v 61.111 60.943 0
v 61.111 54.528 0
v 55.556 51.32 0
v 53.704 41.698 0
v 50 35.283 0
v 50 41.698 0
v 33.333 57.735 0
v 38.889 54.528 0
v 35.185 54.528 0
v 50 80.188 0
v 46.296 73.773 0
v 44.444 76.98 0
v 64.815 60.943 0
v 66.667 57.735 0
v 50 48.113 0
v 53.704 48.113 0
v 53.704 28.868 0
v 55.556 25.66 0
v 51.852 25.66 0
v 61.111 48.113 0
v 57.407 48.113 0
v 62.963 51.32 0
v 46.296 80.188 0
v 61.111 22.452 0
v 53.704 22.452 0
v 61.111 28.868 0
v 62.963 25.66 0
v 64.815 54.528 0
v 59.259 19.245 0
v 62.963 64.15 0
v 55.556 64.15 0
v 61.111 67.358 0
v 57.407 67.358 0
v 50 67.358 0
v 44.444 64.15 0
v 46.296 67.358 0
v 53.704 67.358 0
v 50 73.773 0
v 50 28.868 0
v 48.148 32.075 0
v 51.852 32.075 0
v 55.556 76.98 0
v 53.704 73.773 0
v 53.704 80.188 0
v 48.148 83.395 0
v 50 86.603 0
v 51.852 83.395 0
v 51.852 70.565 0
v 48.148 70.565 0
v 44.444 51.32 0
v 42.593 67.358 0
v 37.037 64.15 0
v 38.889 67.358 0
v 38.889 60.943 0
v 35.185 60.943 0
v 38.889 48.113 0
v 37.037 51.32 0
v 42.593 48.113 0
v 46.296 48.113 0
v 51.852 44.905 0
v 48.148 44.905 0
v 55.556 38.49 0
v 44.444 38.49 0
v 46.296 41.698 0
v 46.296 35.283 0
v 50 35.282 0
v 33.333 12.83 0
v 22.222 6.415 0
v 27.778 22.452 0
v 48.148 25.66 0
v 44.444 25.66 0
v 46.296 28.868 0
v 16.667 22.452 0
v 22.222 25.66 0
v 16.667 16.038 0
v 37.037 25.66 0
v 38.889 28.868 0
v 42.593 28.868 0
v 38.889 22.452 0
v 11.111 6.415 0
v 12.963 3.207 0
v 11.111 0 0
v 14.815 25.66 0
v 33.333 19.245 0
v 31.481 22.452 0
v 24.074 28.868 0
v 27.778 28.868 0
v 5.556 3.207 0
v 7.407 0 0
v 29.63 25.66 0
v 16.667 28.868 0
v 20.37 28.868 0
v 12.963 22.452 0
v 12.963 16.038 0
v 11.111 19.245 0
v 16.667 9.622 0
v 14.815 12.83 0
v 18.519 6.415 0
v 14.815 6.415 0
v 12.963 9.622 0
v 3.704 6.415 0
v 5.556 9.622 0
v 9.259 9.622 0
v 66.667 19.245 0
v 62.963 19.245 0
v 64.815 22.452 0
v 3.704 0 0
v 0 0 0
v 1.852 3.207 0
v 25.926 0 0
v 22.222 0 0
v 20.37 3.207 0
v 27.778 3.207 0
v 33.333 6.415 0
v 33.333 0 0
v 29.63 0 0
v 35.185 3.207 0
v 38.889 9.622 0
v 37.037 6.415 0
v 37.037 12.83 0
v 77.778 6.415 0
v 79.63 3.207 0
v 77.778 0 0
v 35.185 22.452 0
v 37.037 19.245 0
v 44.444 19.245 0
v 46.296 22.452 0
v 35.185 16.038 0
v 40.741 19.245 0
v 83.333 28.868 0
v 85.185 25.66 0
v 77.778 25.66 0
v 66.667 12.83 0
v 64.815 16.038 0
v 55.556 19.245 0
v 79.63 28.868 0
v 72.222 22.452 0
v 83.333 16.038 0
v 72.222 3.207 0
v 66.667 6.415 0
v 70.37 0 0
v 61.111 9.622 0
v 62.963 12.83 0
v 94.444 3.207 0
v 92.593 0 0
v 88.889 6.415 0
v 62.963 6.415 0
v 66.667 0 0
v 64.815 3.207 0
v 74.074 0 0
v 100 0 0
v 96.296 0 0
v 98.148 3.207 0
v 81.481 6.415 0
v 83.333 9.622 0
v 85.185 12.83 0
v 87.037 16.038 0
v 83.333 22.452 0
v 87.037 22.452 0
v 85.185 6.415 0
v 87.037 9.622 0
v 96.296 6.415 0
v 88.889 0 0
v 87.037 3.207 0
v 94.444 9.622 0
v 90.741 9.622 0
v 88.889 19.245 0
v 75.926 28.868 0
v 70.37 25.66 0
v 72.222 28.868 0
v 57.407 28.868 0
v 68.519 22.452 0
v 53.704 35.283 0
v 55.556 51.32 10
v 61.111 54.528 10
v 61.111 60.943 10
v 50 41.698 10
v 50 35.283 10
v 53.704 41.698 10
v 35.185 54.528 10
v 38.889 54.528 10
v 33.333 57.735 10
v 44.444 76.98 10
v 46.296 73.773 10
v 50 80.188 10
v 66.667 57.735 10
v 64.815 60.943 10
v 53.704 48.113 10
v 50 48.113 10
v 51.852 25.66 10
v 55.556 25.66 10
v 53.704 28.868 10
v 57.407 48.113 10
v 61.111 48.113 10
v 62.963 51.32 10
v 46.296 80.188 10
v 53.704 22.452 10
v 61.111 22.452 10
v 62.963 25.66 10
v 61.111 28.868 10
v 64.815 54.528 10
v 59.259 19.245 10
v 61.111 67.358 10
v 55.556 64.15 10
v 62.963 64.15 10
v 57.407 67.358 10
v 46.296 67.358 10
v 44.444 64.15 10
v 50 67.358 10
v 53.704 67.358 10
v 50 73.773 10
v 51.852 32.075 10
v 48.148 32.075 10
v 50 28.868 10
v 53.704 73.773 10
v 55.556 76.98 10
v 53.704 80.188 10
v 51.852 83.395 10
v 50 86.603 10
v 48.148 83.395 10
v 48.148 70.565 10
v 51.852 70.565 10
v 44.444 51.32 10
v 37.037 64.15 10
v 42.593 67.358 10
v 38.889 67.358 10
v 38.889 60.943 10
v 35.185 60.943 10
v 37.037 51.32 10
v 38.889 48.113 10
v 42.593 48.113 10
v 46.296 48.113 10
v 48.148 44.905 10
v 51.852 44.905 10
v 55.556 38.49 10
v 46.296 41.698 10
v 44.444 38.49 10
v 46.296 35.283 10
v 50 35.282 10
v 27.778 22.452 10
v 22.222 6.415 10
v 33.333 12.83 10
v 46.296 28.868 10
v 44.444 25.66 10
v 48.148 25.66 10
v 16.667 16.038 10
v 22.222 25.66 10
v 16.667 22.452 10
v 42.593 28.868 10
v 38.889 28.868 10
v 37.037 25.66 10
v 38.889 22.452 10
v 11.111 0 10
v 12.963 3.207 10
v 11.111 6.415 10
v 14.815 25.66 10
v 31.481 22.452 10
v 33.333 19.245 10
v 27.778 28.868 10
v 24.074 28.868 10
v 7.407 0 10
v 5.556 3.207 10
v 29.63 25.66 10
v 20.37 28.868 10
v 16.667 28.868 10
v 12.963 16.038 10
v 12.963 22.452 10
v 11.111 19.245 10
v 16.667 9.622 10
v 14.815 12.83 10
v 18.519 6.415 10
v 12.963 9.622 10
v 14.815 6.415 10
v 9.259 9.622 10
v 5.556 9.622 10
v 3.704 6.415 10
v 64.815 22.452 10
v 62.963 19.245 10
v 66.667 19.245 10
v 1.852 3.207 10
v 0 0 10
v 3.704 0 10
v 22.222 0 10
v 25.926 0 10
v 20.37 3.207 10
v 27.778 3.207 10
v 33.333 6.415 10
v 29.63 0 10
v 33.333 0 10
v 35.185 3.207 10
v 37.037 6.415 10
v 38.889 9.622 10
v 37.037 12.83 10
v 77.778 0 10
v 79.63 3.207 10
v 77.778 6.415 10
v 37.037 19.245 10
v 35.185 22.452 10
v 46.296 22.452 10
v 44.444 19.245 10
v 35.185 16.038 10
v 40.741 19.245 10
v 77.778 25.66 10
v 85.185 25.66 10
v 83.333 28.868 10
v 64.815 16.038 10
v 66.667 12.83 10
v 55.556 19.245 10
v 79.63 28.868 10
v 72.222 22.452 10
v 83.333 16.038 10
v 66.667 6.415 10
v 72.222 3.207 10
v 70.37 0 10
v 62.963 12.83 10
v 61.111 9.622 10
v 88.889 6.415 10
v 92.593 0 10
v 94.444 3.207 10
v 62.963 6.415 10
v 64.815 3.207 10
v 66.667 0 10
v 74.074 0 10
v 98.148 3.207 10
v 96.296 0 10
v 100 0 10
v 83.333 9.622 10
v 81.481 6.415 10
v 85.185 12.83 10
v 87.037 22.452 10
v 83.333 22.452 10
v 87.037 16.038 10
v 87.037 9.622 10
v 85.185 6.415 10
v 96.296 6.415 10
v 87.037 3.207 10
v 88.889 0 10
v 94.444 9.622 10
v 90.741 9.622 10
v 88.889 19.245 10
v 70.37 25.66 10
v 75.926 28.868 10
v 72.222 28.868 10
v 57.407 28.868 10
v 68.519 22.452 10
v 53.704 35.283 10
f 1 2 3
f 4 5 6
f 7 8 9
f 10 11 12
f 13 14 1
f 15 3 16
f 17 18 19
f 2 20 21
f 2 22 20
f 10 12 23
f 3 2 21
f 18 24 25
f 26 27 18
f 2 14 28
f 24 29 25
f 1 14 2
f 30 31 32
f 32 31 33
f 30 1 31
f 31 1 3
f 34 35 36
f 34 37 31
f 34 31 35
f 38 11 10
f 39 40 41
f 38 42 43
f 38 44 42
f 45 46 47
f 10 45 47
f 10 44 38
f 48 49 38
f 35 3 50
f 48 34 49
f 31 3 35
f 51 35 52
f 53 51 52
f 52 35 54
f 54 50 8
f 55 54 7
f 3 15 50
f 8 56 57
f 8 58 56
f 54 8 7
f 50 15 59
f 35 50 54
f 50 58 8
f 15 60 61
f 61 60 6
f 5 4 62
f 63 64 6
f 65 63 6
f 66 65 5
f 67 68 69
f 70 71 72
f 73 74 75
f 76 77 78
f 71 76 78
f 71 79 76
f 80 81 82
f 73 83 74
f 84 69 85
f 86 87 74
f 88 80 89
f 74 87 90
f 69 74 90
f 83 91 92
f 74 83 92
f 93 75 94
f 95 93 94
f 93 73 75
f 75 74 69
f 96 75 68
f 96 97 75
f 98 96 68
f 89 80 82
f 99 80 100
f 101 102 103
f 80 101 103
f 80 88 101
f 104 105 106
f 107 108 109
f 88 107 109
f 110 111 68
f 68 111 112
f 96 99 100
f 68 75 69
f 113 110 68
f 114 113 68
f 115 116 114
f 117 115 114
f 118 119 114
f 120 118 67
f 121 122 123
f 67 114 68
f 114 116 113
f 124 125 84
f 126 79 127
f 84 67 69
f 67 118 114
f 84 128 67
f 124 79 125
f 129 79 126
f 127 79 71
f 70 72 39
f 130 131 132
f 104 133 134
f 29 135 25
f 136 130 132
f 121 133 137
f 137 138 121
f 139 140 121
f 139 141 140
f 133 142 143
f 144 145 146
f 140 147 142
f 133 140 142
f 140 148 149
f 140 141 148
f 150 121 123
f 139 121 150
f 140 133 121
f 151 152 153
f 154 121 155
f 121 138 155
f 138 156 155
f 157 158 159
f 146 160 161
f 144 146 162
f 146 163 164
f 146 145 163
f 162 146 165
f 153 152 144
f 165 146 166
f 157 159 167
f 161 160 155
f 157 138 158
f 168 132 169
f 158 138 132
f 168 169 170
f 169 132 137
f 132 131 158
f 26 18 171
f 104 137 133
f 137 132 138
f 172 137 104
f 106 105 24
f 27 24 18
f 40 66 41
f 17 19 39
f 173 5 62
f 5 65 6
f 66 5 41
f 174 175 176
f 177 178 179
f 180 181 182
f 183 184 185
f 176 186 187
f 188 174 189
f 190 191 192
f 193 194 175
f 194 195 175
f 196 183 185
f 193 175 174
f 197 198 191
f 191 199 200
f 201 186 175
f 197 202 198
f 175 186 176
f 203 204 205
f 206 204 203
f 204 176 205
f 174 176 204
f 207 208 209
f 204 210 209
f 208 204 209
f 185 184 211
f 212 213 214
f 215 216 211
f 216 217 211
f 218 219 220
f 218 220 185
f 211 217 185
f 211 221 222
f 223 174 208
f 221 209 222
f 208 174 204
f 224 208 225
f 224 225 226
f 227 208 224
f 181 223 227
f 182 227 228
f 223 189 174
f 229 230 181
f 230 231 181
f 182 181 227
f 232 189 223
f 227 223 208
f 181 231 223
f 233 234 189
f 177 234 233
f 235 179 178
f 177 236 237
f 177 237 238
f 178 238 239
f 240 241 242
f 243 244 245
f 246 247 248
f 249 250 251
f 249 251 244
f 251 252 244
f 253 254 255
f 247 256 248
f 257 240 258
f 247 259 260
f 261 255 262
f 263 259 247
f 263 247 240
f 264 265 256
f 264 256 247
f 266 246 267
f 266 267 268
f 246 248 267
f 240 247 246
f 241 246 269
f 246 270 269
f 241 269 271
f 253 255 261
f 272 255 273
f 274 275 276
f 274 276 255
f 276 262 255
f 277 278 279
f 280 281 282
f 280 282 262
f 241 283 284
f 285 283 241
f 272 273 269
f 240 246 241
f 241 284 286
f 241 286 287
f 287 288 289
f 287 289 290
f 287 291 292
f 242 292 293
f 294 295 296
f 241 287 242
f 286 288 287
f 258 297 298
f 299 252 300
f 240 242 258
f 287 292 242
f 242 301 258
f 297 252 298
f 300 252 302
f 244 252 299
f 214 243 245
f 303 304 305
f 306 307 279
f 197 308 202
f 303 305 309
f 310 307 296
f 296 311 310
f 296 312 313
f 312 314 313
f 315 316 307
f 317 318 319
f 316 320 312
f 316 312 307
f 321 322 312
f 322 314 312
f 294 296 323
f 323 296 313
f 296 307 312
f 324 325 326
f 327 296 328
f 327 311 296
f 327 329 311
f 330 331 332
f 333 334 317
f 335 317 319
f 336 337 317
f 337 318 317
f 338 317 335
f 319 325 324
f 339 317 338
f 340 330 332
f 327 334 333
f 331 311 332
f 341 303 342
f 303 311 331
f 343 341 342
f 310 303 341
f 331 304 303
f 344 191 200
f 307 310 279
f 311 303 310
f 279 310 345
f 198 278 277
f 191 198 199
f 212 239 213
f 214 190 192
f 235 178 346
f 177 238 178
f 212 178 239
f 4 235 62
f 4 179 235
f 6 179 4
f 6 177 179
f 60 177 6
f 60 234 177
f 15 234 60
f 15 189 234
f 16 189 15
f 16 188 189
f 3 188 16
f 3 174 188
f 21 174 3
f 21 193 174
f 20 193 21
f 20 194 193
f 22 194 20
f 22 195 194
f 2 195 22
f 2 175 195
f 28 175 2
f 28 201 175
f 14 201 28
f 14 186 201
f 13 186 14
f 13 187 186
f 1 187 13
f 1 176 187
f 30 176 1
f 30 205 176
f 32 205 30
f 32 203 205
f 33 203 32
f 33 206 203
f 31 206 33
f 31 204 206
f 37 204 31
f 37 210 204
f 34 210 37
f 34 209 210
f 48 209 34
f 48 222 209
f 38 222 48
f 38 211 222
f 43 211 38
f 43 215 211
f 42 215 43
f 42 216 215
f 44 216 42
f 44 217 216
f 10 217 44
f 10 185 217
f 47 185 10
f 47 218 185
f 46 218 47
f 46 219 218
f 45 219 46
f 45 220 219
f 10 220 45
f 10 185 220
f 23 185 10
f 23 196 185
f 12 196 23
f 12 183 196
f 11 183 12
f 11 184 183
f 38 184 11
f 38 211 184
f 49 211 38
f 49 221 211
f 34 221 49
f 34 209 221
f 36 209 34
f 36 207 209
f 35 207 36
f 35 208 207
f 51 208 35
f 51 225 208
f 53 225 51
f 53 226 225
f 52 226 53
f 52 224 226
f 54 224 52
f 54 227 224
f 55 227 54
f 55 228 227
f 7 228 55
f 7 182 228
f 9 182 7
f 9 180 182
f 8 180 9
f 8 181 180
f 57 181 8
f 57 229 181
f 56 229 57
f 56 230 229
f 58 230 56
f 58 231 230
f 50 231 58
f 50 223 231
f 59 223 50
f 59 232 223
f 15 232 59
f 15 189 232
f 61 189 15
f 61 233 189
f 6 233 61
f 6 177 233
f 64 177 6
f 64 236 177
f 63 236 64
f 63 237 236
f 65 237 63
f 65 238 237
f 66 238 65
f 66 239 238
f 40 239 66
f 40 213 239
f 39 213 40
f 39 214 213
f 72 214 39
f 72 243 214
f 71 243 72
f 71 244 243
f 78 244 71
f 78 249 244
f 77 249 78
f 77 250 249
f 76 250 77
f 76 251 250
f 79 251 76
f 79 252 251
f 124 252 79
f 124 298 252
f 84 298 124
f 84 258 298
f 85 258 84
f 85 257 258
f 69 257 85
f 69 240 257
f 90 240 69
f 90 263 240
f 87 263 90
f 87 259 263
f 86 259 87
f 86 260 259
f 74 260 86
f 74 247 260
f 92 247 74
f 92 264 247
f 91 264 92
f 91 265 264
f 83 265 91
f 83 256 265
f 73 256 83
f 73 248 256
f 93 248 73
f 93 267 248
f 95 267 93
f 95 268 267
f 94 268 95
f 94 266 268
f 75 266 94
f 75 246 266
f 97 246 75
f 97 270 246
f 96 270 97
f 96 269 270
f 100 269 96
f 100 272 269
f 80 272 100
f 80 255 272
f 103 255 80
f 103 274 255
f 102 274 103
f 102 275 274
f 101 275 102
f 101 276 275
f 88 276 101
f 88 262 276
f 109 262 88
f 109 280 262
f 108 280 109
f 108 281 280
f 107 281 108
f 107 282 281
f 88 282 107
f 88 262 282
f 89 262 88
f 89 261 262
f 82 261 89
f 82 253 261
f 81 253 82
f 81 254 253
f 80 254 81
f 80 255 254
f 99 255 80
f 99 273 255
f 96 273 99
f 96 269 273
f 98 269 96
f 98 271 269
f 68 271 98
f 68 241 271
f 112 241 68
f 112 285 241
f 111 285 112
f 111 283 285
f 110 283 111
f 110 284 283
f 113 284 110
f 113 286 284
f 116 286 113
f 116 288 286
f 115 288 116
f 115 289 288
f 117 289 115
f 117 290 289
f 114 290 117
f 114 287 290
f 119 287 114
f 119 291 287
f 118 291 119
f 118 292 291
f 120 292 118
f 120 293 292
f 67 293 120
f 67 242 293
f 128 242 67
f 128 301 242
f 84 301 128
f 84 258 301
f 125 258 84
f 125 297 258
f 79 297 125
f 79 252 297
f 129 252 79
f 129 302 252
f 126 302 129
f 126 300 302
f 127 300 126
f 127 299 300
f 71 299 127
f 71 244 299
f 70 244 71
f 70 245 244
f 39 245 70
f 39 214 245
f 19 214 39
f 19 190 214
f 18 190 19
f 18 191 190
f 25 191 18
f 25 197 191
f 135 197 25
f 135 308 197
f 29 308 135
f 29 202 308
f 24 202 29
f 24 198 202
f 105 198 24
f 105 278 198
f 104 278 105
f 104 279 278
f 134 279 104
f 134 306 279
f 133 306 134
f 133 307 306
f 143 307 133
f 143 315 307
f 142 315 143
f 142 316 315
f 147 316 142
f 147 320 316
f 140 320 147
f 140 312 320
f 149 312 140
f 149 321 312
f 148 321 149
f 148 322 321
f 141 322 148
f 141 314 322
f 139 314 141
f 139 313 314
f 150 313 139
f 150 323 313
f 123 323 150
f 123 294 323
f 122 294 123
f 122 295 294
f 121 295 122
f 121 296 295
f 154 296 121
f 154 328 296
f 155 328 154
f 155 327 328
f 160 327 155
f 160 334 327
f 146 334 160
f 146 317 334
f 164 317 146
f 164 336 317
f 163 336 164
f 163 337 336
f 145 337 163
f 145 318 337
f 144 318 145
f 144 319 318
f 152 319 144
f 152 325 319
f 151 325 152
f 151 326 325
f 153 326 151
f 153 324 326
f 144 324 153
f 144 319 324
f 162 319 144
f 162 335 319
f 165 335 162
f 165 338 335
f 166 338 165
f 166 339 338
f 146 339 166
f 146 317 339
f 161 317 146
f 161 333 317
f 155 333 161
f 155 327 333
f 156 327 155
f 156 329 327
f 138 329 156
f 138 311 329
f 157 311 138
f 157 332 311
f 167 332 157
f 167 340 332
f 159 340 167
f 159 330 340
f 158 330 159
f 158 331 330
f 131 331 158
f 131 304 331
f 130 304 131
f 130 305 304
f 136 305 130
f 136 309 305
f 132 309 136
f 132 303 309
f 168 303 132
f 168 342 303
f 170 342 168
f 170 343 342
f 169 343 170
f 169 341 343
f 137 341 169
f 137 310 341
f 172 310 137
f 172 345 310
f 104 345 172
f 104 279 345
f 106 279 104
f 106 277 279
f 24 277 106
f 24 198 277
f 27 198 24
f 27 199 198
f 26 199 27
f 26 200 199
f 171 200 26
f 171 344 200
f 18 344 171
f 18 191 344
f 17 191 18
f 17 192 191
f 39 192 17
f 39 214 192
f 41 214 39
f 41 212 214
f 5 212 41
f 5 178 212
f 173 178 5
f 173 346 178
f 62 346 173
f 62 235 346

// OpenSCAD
linear_extrude(height = 10) {
	polygon(points = [[0, 0], [3.703703703703704, 0.0], [5.555555555555556, 3.207501495497921], [7.407407407407408, 0.0], [11.111111111111112, 0.0], [12.962962962962964, 3.2075014954979206], [11.111111111111112, 6.415002990995841], [14.814814814814817, 6.415002990995841], [16.666666666666668, 9.622504486493762], [18.51851851851852, 6.415002990995841], [22.222222222222225, 6.415002990995842], [20.370370370370374, 3.2075014954979206], [22.222222222222225, 0.0], [25.925925925925927, 0.0], [27.77777777777778, 3.2075014954979206], [29.629629629629633, 0.0], [33.333333333333336, 0.0], [35.18518518518519, 3.2075014954979206], [33.333333333333336, 6.415002990995842], [37.03703703703704, 6.415002990995841], [38.88888888888889, 9.622504486493762], [37.037037037037045, 12.830005981991683], [33.333333333333336, 12.830005981991684], [35.18518518518519, 16.037507477489605], [33.33333333333334, 19.245008972987524], [37.037037037037045, 19.245008972987524], [38.88888888888889, 22.452510468485443], [40.74074074074074, 19.245008972987524], [44.44444444444444, 19.245008972987524], [46.2962962962963, 22.452510468485446], [44.44444444444444, 25.660011963983365], [48.148148148148145, 25.660011963983365], [50.0, 28.867513459481287], [51.851851851851855, 25.66001196398337], [55.55555555555556, 25.66001196398337], [53.7037037037037, 22.452510468485446], [55.55555555555556, 19.245008972987527], [59.25925925925926, 19.245008972987527], [61.111111111111114, 22.45251046848545], [62.96296296296297, 19.245008972987527], [66.66666666666667, 19.245008972987527], [64.81481481481482, 16.037507477489605], [66.66666666666667, 12.830005981991684], [62.96296296296297, 12.830005981991686], [61.111111111111114, 9.622504486493764], [62.96296296296297, 6.415002990995843], [66.66666666666667, 6.415002990995843], [64.81481481481482, 3.2075014954979215], [66.66666666666667, 0.0], [70.37037037037038, 0.0], [72.22222222222223, 3.207501495497922], [74.07407407407408, 0.0], [77.77777777777779, 0.0], [79.62962962962963, 3.2075014954979206], [77.7777777777778, 6.415002990995842], [81.4814814814815, 6.415002990995841], [83.33333333333334, 9.622504486493762], [85.18518518518519, 6.415002990995841], [88.88888888888889, 6.415002990995838], [87.03703703703704, 3.2075014954979206], [88.88888888888889, 0.0], [92.5925925925926, 0.0], [94.44444444444444, 3.207501495497922], [96.29629629629629, 0.0], [100, 0], [98.14814814814815, 3.2075014954979206], [94.44444444444446, 3.2075014954979197], [96.29629629629629, 6.415002990995841], [94.44444444444444, 9.622504486493762], [90.74074074074073, 9.622504486493762], [88.88888888888889, 6.415002990995838], [87.03703703703704, 9.62250448649376], [83.33333333333333, 9.62250448649376], [85.18518518518518, 12.83000598199168], [83.33333333333334, 16.0375074774896], [87.03703703703704, 16.0375074774896], [88.88888888888889, 19.245008972987524], [87.03703703703704, 22.452510468485446], [83.33333333333334, 22.452510468485443], [85.18518518518518, 25.660011963983365], [83.33333333333333, 28.867513459481287], [79.62962962962962, 28.867513459481287], [77.77777777777777, 25.660011963983365], [75.92592592592592, 28.867513459481287], [72.22222222222221, 28.867513459481287], [70.37037037037037, 25.66001196398337], [72.2222222222222, 22.452510468485446], [68.5185185185185, 22.452510468485446], [66.66666666666666, 19.245008972987527], [64.81481481481481, 22.452510468485446], [61.11111111111111, 22.45251046848545], [62.96296296296296, 25.66001196398337], [61.111111111111114, 28.867513459481287], [57.40740740740741, 28.867513459481287], [55.55555555555556, 25.660011963983365], [53.7037037037037, 28.867513459481287], [50.0, 28.867513459481287], [51.85185185185185, 32.07501495497921], [49.99999999999999, 35.28251645047713], [53.7037037037037, 35.282516450477125], [55.55555555555555, 38.49001794597505], [53.7037037037037, 41.69751944147297], [49.99999999999999, 41.69751944147296], [51.85185185185185, 44.905020936970885], [50.0, 48.11252243246881], [53.7037037037037, 48.11252243246881], [55.55555555555556, 51.32002392796673], [57.407407407407405, 48.11252243246881], [61.11111111111111, 48.11252243246881], [62.962962962962955, 51.32002392796673], [61.11111111111111, 54.52752542346465], [64.81481481481481, 54.52752542346465], [66.66666666666666, 57.735026918962575], [64.81481481481481, 60.9425284144605], [61.11111111111111, 60.9425284144605], [62.962962962962955, 64.15002990995842], [61.11111111111111, 67.35753140545634], [57.407407407407405, 67.35753140545634], [55.55555555555556, 64.15002990995842], [53.7037037037037, 67.35753140545634], [50.0, 67.35753140545634], [51.85185185185185, 70.56503290095426], [50.0, 73.77253439645219], [53.7037037037037, 73.77253439645217], [55.55555555555555, 76.9800358919501], [53.7037037037037, 80.18753738744802], [49.99999999999999, 80.18753738744802], [51.85185185185185, 83.39503888294594], [50.0, 86.60254037844386], [48.148148148148145, 83.39503888294594], [50.0, 80.18753738744802], [46.2962962962963, 80.18753738744802], [44.44444444444444, 76.9800358919501], [46.2962962962963, 73.77253439645217], [50.0, 73.77253439645219], [48.148148148148145, 70.56503290095426], [50.0, 67.35753140545634], [46.2962962962963, 67.35753140545634], [44.44444444444444, 64.15002990995842], [42.59259259259259, 67.35753140545634], [38.888888888888886, 67.35753140545634], [37.03703703703703, 64.15002990995842], [38.888888888888886, 60.9425284144605], [35.18518518518518, 60.9425284144605], [33.33333333333333, 57.735026918962575], [35.18518518518518, 54.52752542346465], [38.888888888888886, 54.52752542346465], [37.03703703703703, 51.32002392796674], [38.888888888888886, 48.112522432468815], [42.59259259259259, 48.112522432468815], [44.44444444444444, 51.32002392796674], [46.2962962962963, 48.112522432468815], [50.0, 48.112522432468815], [48.148148148148145, 44.90502093697089], [50.0, 41.69751944147298], [46.2962962962963, 41.69751944147298], [44.44444444444444, 38.490017945975055], [46.2962962962963, 35.28251645047713], [50.0, 35.28251645047713], [48.148148148148145, 32.07501495497921], [50.0, 28.867513459481287], [46.2962962962963, 28.867513459481287], [44.44444444444444, 25.660011963983365], [42.59259259259259, 28.867513459481287], [38.888888888888886, 28.867513459481287], [37.03703703703703, 25.66001196398337], [38.888888888888886, 22.452510468485446], [35.18518518518518, 22.452510468485446], [33.33333333333333, 19.245008972987527], [31.481481481481477, 22.452510468485446], [27.77777777777777, 22.452510468485446], [29.629629629629626, 25.66001196398337], [27.777777777777775, 28.867513459481287], [24.074074074074073, 28.867513459481287], [22.22222222222222, 25.660011963983365], [20.370370370370367, 28.867513459481287], [16.666666666666664, 28.867513459481287], [14.814814814814813, 25.66001196398337], [16.666666666666664, 22.452510468485446], [12.962962962962962, 22.452510468485446], [11.11111111111111, 19.245008972987527], [12.962962962962962, 16.037507477489605], [16.666666666666664, 16.037507477489605], [14.814814814814813, 12.830005981991686], [16.666666666666664, 9.622504486493764], [12.962962962962962, 9.622504486493764], [11.11111111111111, 6.415002990995843], [9.25925925925926, 9.622504486493764], [5.555555555555555, 9.622504486493764], [3.7037037037037033, 6.415002990995843], [5.555555555555555, 3.2075014954979215], [1.8518518518518516, 3.2075014954979215]]);
}
